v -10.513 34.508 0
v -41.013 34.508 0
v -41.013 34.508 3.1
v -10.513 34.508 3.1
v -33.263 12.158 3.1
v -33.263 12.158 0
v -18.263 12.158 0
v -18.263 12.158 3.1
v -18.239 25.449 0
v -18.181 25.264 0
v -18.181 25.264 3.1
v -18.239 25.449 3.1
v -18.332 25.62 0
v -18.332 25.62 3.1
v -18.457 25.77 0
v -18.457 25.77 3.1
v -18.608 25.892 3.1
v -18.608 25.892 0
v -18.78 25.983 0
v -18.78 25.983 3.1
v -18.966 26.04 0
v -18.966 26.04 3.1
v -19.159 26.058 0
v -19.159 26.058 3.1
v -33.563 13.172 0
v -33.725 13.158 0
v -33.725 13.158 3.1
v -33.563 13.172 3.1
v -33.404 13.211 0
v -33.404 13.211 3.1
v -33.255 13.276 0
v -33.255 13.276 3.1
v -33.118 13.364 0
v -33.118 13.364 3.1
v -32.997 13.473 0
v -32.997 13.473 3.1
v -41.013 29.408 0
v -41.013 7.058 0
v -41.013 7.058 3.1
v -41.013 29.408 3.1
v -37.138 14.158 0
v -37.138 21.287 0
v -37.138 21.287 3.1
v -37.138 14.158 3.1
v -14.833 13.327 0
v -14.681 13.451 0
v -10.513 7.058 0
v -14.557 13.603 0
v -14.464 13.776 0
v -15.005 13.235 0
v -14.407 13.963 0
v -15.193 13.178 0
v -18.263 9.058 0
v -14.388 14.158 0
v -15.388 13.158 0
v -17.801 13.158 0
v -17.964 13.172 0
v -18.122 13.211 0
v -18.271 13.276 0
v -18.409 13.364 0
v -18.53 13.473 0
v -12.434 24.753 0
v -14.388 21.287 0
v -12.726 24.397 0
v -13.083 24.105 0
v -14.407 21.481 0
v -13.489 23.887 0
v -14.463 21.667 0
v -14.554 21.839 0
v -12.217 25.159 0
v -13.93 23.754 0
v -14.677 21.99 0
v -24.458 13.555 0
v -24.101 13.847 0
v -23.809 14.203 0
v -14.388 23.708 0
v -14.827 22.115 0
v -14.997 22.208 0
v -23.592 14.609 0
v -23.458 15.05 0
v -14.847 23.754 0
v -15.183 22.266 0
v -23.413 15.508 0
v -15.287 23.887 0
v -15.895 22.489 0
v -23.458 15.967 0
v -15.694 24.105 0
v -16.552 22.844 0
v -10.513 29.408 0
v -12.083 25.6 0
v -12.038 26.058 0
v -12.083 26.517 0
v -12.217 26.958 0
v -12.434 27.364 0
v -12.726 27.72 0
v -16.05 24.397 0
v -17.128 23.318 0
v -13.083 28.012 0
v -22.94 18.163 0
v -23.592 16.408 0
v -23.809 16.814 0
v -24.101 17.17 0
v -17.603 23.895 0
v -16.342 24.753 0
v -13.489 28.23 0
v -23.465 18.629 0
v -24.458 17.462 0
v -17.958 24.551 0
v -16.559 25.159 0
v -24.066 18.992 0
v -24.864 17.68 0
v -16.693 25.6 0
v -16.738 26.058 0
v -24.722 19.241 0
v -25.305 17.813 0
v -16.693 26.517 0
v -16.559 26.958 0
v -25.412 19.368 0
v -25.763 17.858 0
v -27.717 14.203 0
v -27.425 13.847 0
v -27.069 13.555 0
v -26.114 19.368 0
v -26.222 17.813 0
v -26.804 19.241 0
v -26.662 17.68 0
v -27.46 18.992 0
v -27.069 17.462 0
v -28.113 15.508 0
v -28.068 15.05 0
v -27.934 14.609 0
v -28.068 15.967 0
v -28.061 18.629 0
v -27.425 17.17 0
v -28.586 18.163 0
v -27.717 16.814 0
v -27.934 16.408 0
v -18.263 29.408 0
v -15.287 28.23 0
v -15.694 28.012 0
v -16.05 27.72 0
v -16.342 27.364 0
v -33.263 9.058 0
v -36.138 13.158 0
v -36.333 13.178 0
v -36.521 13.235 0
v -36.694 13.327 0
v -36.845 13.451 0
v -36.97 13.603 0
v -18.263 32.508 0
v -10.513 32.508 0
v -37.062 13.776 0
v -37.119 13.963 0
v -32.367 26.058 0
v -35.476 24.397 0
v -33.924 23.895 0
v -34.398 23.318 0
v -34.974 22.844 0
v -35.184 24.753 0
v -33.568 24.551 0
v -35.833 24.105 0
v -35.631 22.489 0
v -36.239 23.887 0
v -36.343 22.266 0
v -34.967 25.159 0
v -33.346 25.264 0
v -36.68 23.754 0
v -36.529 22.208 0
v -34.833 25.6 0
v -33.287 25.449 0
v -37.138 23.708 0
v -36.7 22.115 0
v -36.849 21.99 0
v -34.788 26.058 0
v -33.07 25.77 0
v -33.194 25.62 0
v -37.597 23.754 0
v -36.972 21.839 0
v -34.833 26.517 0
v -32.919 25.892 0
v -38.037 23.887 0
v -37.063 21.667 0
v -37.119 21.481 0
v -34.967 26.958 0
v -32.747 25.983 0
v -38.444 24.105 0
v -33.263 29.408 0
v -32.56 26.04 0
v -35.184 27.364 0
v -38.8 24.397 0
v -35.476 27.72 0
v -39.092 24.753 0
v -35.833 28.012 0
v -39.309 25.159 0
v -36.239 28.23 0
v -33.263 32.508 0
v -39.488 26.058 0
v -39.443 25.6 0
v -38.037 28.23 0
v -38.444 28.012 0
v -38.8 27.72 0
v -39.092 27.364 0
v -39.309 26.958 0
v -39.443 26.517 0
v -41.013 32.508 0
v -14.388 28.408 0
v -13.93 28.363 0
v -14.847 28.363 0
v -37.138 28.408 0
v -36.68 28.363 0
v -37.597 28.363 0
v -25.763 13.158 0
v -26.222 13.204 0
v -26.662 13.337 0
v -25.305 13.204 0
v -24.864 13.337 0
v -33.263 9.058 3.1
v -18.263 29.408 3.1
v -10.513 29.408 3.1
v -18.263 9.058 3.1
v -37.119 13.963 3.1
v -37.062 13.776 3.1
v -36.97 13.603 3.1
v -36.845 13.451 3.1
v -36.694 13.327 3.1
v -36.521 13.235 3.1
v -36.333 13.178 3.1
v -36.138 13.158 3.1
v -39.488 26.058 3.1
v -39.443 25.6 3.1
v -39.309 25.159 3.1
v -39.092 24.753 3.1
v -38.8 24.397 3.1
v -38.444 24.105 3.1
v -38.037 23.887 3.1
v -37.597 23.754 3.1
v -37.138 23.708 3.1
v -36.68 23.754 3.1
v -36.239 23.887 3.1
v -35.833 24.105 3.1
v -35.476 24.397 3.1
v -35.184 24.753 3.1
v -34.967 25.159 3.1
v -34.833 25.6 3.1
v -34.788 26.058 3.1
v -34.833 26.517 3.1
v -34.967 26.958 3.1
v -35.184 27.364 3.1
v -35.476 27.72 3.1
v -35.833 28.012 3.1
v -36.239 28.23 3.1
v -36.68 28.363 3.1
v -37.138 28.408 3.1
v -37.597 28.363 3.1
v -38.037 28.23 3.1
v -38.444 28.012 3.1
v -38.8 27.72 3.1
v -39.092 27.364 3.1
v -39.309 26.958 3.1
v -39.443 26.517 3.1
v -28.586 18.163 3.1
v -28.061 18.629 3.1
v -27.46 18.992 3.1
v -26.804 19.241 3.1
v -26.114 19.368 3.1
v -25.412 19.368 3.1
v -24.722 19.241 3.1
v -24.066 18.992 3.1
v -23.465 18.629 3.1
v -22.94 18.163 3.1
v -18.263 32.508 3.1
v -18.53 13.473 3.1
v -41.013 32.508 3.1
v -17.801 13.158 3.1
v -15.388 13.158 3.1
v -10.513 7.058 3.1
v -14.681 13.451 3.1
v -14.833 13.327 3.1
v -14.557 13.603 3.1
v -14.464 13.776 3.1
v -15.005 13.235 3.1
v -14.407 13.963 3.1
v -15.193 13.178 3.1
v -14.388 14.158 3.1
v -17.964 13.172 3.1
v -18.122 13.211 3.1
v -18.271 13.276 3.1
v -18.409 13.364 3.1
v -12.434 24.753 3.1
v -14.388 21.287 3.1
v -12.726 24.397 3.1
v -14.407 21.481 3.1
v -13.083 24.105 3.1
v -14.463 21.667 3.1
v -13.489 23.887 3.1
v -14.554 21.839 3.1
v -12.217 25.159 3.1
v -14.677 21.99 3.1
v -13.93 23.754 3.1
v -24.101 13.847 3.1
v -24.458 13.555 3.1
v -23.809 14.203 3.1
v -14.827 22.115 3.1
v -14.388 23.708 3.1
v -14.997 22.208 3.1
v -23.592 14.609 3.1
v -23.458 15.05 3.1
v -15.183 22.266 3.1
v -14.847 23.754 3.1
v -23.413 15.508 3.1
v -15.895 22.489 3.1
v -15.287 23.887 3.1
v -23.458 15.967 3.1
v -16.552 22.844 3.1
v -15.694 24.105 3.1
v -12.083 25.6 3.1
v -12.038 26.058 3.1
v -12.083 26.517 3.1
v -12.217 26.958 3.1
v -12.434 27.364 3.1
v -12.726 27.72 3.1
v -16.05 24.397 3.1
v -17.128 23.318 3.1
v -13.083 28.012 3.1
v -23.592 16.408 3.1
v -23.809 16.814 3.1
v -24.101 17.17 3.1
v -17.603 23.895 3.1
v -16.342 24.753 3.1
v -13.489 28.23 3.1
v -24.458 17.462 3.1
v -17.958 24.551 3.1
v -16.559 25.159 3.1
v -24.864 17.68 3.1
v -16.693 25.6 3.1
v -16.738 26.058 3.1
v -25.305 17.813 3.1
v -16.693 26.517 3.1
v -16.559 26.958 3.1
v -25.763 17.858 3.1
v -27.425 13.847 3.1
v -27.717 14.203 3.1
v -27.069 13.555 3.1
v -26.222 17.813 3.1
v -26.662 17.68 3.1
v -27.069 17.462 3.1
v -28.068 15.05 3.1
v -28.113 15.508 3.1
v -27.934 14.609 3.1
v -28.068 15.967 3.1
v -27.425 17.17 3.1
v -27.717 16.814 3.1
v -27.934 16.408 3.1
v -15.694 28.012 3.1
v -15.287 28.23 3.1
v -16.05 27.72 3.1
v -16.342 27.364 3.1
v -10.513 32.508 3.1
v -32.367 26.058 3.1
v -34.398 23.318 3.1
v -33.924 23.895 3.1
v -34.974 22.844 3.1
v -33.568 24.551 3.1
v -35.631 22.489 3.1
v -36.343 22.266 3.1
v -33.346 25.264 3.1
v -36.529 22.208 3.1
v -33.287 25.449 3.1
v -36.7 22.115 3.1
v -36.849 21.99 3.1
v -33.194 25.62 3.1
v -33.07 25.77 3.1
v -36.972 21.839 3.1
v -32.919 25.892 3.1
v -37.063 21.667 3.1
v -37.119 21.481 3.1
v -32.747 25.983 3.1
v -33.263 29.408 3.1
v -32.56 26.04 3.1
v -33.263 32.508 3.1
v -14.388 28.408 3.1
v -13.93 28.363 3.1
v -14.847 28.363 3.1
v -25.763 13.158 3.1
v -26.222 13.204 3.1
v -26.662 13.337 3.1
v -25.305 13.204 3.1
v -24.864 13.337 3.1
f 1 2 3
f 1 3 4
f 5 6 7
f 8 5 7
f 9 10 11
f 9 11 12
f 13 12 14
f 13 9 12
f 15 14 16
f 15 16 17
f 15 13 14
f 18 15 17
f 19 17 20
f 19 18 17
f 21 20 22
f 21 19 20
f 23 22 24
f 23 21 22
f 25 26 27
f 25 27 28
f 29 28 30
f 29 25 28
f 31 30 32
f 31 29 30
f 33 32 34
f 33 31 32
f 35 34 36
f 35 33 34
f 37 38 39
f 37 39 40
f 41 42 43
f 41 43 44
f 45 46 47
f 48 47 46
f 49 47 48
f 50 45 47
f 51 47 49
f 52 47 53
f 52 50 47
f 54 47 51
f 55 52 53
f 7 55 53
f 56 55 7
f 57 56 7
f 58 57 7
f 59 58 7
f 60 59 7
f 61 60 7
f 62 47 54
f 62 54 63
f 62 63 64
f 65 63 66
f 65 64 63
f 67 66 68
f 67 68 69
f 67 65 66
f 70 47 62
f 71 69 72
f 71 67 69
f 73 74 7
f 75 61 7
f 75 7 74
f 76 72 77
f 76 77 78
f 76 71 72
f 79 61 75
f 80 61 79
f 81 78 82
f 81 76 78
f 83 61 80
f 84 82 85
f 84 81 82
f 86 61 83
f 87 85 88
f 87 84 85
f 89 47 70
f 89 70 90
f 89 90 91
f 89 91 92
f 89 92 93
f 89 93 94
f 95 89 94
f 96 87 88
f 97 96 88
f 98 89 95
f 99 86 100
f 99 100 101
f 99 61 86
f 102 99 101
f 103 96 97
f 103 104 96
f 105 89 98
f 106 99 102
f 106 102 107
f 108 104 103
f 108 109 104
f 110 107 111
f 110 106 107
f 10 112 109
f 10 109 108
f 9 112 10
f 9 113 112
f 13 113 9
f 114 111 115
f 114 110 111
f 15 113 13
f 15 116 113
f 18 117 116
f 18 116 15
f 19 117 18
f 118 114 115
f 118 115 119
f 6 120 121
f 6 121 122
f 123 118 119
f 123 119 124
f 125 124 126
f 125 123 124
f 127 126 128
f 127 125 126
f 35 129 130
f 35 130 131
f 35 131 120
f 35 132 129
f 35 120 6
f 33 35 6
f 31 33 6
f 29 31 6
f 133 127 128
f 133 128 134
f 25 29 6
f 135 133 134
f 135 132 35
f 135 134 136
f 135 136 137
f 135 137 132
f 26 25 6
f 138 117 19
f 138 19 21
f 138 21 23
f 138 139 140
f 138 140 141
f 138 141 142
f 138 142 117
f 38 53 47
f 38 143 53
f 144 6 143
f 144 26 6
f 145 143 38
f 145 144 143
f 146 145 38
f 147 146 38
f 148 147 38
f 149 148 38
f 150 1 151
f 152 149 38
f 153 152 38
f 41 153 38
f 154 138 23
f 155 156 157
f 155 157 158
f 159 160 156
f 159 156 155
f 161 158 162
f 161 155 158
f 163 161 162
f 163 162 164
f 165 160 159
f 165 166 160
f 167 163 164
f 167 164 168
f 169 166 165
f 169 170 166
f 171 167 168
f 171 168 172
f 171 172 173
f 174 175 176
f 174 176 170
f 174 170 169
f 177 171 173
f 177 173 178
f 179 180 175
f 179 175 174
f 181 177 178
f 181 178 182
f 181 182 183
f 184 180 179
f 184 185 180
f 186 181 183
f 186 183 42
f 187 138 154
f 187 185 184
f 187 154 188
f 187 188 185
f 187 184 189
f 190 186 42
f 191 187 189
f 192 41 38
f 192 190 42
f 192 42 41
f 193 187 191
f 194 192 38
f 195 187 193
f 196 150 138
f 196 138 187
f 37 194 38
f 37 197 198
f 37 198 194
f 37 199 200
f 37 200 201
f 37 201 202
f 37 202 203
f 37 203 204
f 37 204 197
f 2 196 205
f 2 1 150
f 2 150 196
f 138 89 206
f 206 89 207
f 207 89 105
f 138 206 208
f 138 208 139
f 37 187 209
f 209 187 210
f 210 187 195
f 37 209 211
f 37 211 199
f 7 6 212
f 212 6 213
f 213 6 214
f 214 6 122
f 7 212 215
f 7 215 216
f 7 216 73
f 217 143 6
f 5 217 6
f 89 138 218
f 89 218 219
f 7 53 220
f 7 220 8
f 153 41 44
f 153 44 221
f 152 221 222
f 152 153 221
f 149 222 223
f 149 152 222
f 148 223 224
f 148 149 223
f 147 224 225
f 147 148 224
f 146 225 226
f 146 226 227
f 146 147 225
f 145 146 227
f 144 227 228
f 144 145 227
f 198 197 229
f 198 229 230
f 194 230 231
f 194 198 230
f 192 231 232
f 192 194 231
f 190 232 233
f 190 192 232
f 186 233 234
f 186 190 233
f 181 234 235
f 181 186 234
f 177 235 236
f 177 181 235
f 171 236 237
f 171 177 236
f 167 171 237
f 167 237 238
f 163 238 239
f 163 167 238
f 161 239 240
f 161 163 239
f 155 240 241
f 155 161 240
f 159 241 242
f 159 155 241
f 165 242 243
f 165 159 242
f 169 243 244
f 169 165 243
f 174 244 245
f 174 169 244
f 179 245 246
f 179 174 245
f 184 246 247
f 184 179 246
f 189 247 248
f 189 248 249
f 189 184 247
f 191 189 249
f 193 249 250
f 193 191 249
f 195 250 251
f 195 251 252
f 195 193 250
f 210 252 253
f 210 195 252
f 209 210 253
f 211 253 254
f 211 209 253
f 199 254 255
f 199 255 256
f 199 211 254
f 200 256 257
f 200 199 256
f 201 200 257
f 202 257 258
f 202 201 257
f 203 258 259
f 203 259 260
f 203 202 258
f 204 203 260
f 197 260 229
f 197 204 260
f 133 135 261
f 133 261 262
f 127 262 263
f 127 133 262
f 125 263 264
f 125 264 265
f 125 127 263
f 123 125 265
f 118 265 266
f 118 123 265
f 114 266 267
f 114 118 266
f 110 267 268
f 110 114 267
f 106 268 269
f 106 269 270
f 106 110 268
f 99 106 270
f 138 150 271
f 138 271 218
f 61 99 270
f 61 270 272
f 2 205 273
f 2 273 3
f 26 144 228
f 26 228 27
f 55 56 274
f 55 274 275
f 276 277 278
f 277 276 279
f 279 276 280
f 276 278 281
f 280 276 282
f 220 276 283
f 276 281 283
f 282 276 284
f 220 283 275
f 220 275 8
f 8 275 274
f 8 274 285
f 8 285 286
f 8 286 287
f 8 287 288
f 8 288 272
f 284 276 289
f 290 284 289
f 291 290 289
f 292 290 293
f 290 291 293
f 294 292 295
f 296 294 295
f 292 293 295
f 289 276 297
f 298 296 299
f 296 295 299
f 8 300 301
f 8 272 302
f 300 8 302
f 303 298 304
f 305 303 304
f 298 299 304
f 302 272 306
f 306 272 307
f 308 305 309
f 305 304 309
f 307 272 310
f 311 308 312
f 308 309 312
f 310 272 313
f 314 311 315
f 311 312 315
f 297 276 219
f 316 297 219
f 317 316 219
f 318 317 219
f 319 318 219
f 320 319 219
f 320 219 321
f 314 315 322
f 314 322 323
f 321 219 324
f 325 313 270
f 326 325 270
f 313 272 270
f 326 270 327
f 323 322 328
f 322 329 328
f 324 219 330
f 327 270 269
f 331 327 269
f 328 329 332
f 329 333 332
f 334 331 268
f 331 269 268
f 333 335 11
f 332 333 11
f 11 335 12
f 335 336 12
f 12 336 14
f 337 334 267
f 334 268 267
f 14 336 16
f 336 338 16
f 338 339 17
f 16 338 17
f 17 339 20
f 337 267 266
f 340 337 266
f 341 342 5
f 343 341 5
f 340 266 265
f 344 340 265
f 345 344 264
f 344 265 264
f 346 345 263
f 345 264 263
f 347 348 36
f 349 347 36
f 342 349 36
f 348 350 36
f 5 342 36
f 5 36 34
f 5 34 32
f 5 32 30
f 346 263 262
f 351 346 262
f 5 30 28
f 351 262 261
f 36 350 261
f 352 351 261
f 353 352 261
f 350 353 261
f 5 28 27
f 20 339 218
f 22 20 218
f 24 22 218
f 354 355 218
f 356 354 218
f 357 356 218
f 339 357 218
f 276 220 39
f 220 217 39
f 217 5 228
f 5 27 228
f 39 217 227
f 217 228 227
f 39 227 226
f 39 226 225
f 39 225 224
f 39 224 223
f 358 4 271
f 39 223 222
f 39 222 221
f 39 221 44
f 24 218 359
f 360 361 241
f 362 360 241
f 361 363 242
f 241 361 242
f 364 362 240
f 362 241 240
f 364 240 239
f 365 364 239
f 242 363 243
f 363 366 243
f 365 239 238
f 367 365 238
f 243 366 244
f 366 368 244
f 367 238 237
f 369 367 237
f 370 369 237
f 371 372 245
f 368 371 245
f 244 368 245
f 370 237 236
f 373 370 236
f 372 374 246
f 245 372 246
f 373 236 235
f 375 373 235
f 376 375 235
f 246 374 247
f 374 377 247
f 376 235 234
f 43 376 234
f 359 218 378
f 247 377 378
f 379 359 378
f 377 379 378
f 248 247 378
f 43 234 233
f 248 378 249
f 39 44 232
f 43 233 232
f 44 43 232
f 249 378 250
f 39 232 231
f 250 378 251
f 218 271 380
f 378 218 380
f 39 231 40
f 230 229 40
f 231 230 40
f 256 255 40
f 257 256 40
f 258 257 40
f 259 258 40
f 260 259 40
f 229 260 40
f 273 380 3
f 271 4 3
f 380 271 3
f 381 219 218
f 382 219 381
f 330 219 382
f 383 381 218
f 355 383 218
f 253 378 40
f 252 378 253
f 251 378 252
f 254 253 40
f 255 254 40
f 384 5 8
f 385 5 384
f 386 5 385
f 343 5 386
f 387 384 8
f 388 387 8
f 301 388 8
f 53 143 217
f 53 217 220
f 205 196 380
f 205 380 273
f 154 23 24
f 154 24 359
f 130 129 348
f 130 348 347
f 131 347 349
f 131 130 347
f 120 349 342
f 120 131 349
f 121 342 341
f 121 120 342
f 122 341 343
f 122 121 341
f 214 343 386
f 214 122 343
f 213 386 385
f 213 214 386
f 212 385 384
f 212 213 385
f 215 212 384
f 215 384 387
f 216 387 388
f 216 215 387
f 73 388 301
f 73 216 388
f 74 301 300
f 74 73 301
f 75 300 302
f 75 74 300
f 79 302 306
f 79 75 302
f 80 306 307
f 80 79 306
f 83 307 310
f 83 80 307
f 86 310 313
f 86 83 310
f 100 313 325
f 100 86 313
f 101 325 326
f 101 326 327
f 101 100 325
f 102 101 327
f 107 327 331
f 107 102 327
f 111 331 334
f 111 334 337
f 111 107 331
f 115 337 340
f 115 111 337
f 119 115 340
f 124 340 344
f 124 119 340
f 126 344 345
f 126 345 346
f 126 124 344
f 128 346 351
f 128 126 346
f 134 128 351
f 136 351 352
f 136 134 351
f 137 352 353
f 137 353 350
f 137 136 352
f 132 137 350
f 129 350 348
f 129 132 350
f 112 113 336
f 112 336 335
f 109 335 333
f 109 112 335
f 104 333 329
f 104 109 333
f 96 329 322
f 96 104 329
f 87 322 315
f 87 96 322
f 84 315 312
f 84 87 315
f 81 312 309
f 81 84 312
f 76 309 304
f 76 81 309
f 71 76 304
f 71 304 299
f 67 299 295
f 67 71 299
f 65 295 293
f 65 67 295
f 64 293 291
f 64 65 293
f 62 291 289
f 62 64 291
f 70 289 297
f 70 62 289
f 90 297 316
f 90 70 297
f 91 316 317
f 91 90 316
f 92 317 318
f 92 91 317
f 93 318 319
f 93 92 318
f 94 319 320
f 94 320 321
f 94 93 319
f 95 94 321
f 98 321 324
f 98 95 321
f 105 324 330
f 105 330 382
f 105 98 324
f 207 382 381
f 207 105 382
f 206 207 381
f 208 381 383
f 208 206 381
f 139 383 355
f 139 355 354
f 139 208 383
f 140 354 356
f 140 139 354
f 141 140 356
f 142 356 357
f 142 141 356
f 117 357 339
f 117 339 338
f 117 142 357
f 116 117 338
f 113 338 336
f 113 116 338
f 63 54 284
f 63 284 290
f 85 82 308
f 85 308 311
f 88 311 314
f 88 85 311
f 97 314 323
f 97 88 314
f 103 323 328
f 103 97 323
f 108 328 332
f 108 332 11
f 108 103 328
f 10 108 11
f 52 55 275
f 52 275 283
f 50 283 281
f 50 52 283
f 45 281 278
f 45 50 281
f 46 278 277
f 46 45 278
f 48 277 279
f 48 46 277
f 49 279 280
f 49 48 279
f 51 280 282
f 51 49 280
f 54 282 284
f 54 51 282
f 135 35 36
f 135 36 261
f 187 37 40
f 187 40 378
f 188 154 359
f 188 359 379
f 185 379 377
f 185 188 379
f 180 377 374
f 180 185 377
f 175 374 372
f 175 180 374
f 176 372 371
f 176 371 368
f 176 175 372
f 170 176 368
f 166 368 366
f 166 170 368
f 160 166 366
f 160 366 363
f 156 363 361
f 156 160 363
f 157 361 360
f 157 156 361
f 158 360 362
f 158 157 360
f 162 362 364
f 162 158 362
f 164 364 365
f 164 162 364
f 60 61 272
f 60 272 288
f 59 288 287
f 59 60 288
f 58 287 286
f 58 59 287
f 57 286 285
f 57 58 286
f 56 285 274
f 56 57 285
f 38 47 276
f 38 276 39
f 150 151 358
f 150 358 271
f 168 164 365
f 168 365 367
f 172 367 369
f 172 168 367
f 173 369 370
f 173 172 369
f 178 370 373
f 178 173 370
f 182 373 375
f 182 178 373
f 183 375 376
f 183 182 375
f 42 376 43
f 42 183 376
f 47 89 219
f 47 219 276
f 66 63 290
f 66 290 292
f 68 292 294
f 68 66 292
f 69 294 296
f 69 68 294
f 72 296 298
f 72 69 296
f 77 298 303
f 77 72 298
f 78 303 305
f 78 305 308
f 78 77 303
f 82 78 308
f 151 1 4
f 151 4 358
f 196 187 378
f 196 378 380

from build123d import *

# Parameters (mm, degrees)
SKETCH1_R      = 2.35
SKETCH1_W      = 15
SKETCH1_H      = 3.1
EXTRUDE1_DEPTH = 3.1


with BuildPart() as part:
    # Sketch1 → Extrude1 (new body)
    with BuildSketch(Plane.XY):
        Polygon((-41.013157114, 34.508489293), (-10.513157114, 34.508489293), (-10.513157114, 32.508489293), (-18.263157114, 32.508489293), (-18.263157114, 29.408489293), (-10.513157114, 29.408489293), (-10.513157114, 7.058489293), (-41.013157114, 7.058489293), (-41.013157114, 29.408489293), (-33.263157114, 29.408489293), (-33.263157114, 32.508489293), (-41.013157114, 32.508489293), align=None)
        with Locations(Location((-14.388157114, 26.058489293, 0), (0, 0, 180))):
            Circle(SKETCH1_R, mode=Mode.SUBTRACT)
        with Locations(Location((-37.138157114, 26.058489293, 0), (0, 0, 180))):
            Circle(SKETCH1_R, mode=Mode.SUBTRACT)
        with Locations(Location((-25.763157114, 15.508489293, 0), (0, 0, 180))):
            Circle(SKETCH1_R, mode=Mode.SUBTRACT)
        with BuildLine():
            Line((-37.138157114, 21.287155622), (-37.138157114, 14.158489293))
            ThreePointArc((-37.138157114, 14.158489293), (-36.845263895, 13.451382512), (-36.138157114, 13.158489293))
            Line((-36.138157114, 13.158489293), (-33.725119975, 13.158489293))
            ThreePointArc((-33.725119975, 13.158489293), (-33.328320215, 13.240584097), (-32.996670851, 13.473389392))
            Line((-32.996670851, 13.473389392), (-28.585897467, 18.16325141))
            ThreePointArc((-28.585897467, 18.16325141), (-25.763157114, 19.383489293), (-22.940416761, 18.16325141))
            Line((-22.940416761, 18.16325141), (-18.529643377, 13.473389392))
            ThreePointArc((-18.529643377, 13.473389392), (-18.197994013, 13.240584097), (-17.801194253, 13.158489293))
            Line((-17.801194253, 13.158489293), (-15.388157114, 13.158489293))
            ThreePointArc((-15.388157114, 13.158489293), (-14.681050333, 13.451382512), (-14.388157114, 14.158489293))
            Line((-14.388157114, 14.158489293), (-14.388157114, 21.287155622))
            ThreePointArc((-14.388157114, 21.287155622), (-14.611907088, 21.917580794), (-15.183028909, 22.265890734))
            ThreePointArc((-15.183028909, 22.265890734), (-17.128195891, 23.318450516), (-18.180755673, 25.263617499))
            ThreePointArc((-18.180755673, 25.263617499), (-18.529065613, 25.834739319), (-19.159490785, 26.058489293))
            Line((-19.159490785, 26.058489293), (-32.366823443, 26.058489293))
            ThreePointArc((-32.366823443, 26.058489293), (-32.997248615, 25.834739319), (-33.345558555, 25.263617499))
            ThreePointArc((-33.345558555, 25.263617499), (-34.398118337, 23.318450516), (-36.343285319, 22.265890734))
            ThreePointArc((-36.343285319, 22.265890734), (-36.91440714, 21.917580794), (-37.138157114, 21.287155622))
        make_face(mode=Mode.SUBTRACT)
        with Locations((-25.763157114, 10.608489293)):
            Rectangle(SKETCH1_W, SKETCH1_H, mode=Mode.SUBTRACT)
    extrude(amount=EXTRUDE1_DEPTH)


solid = part.part
